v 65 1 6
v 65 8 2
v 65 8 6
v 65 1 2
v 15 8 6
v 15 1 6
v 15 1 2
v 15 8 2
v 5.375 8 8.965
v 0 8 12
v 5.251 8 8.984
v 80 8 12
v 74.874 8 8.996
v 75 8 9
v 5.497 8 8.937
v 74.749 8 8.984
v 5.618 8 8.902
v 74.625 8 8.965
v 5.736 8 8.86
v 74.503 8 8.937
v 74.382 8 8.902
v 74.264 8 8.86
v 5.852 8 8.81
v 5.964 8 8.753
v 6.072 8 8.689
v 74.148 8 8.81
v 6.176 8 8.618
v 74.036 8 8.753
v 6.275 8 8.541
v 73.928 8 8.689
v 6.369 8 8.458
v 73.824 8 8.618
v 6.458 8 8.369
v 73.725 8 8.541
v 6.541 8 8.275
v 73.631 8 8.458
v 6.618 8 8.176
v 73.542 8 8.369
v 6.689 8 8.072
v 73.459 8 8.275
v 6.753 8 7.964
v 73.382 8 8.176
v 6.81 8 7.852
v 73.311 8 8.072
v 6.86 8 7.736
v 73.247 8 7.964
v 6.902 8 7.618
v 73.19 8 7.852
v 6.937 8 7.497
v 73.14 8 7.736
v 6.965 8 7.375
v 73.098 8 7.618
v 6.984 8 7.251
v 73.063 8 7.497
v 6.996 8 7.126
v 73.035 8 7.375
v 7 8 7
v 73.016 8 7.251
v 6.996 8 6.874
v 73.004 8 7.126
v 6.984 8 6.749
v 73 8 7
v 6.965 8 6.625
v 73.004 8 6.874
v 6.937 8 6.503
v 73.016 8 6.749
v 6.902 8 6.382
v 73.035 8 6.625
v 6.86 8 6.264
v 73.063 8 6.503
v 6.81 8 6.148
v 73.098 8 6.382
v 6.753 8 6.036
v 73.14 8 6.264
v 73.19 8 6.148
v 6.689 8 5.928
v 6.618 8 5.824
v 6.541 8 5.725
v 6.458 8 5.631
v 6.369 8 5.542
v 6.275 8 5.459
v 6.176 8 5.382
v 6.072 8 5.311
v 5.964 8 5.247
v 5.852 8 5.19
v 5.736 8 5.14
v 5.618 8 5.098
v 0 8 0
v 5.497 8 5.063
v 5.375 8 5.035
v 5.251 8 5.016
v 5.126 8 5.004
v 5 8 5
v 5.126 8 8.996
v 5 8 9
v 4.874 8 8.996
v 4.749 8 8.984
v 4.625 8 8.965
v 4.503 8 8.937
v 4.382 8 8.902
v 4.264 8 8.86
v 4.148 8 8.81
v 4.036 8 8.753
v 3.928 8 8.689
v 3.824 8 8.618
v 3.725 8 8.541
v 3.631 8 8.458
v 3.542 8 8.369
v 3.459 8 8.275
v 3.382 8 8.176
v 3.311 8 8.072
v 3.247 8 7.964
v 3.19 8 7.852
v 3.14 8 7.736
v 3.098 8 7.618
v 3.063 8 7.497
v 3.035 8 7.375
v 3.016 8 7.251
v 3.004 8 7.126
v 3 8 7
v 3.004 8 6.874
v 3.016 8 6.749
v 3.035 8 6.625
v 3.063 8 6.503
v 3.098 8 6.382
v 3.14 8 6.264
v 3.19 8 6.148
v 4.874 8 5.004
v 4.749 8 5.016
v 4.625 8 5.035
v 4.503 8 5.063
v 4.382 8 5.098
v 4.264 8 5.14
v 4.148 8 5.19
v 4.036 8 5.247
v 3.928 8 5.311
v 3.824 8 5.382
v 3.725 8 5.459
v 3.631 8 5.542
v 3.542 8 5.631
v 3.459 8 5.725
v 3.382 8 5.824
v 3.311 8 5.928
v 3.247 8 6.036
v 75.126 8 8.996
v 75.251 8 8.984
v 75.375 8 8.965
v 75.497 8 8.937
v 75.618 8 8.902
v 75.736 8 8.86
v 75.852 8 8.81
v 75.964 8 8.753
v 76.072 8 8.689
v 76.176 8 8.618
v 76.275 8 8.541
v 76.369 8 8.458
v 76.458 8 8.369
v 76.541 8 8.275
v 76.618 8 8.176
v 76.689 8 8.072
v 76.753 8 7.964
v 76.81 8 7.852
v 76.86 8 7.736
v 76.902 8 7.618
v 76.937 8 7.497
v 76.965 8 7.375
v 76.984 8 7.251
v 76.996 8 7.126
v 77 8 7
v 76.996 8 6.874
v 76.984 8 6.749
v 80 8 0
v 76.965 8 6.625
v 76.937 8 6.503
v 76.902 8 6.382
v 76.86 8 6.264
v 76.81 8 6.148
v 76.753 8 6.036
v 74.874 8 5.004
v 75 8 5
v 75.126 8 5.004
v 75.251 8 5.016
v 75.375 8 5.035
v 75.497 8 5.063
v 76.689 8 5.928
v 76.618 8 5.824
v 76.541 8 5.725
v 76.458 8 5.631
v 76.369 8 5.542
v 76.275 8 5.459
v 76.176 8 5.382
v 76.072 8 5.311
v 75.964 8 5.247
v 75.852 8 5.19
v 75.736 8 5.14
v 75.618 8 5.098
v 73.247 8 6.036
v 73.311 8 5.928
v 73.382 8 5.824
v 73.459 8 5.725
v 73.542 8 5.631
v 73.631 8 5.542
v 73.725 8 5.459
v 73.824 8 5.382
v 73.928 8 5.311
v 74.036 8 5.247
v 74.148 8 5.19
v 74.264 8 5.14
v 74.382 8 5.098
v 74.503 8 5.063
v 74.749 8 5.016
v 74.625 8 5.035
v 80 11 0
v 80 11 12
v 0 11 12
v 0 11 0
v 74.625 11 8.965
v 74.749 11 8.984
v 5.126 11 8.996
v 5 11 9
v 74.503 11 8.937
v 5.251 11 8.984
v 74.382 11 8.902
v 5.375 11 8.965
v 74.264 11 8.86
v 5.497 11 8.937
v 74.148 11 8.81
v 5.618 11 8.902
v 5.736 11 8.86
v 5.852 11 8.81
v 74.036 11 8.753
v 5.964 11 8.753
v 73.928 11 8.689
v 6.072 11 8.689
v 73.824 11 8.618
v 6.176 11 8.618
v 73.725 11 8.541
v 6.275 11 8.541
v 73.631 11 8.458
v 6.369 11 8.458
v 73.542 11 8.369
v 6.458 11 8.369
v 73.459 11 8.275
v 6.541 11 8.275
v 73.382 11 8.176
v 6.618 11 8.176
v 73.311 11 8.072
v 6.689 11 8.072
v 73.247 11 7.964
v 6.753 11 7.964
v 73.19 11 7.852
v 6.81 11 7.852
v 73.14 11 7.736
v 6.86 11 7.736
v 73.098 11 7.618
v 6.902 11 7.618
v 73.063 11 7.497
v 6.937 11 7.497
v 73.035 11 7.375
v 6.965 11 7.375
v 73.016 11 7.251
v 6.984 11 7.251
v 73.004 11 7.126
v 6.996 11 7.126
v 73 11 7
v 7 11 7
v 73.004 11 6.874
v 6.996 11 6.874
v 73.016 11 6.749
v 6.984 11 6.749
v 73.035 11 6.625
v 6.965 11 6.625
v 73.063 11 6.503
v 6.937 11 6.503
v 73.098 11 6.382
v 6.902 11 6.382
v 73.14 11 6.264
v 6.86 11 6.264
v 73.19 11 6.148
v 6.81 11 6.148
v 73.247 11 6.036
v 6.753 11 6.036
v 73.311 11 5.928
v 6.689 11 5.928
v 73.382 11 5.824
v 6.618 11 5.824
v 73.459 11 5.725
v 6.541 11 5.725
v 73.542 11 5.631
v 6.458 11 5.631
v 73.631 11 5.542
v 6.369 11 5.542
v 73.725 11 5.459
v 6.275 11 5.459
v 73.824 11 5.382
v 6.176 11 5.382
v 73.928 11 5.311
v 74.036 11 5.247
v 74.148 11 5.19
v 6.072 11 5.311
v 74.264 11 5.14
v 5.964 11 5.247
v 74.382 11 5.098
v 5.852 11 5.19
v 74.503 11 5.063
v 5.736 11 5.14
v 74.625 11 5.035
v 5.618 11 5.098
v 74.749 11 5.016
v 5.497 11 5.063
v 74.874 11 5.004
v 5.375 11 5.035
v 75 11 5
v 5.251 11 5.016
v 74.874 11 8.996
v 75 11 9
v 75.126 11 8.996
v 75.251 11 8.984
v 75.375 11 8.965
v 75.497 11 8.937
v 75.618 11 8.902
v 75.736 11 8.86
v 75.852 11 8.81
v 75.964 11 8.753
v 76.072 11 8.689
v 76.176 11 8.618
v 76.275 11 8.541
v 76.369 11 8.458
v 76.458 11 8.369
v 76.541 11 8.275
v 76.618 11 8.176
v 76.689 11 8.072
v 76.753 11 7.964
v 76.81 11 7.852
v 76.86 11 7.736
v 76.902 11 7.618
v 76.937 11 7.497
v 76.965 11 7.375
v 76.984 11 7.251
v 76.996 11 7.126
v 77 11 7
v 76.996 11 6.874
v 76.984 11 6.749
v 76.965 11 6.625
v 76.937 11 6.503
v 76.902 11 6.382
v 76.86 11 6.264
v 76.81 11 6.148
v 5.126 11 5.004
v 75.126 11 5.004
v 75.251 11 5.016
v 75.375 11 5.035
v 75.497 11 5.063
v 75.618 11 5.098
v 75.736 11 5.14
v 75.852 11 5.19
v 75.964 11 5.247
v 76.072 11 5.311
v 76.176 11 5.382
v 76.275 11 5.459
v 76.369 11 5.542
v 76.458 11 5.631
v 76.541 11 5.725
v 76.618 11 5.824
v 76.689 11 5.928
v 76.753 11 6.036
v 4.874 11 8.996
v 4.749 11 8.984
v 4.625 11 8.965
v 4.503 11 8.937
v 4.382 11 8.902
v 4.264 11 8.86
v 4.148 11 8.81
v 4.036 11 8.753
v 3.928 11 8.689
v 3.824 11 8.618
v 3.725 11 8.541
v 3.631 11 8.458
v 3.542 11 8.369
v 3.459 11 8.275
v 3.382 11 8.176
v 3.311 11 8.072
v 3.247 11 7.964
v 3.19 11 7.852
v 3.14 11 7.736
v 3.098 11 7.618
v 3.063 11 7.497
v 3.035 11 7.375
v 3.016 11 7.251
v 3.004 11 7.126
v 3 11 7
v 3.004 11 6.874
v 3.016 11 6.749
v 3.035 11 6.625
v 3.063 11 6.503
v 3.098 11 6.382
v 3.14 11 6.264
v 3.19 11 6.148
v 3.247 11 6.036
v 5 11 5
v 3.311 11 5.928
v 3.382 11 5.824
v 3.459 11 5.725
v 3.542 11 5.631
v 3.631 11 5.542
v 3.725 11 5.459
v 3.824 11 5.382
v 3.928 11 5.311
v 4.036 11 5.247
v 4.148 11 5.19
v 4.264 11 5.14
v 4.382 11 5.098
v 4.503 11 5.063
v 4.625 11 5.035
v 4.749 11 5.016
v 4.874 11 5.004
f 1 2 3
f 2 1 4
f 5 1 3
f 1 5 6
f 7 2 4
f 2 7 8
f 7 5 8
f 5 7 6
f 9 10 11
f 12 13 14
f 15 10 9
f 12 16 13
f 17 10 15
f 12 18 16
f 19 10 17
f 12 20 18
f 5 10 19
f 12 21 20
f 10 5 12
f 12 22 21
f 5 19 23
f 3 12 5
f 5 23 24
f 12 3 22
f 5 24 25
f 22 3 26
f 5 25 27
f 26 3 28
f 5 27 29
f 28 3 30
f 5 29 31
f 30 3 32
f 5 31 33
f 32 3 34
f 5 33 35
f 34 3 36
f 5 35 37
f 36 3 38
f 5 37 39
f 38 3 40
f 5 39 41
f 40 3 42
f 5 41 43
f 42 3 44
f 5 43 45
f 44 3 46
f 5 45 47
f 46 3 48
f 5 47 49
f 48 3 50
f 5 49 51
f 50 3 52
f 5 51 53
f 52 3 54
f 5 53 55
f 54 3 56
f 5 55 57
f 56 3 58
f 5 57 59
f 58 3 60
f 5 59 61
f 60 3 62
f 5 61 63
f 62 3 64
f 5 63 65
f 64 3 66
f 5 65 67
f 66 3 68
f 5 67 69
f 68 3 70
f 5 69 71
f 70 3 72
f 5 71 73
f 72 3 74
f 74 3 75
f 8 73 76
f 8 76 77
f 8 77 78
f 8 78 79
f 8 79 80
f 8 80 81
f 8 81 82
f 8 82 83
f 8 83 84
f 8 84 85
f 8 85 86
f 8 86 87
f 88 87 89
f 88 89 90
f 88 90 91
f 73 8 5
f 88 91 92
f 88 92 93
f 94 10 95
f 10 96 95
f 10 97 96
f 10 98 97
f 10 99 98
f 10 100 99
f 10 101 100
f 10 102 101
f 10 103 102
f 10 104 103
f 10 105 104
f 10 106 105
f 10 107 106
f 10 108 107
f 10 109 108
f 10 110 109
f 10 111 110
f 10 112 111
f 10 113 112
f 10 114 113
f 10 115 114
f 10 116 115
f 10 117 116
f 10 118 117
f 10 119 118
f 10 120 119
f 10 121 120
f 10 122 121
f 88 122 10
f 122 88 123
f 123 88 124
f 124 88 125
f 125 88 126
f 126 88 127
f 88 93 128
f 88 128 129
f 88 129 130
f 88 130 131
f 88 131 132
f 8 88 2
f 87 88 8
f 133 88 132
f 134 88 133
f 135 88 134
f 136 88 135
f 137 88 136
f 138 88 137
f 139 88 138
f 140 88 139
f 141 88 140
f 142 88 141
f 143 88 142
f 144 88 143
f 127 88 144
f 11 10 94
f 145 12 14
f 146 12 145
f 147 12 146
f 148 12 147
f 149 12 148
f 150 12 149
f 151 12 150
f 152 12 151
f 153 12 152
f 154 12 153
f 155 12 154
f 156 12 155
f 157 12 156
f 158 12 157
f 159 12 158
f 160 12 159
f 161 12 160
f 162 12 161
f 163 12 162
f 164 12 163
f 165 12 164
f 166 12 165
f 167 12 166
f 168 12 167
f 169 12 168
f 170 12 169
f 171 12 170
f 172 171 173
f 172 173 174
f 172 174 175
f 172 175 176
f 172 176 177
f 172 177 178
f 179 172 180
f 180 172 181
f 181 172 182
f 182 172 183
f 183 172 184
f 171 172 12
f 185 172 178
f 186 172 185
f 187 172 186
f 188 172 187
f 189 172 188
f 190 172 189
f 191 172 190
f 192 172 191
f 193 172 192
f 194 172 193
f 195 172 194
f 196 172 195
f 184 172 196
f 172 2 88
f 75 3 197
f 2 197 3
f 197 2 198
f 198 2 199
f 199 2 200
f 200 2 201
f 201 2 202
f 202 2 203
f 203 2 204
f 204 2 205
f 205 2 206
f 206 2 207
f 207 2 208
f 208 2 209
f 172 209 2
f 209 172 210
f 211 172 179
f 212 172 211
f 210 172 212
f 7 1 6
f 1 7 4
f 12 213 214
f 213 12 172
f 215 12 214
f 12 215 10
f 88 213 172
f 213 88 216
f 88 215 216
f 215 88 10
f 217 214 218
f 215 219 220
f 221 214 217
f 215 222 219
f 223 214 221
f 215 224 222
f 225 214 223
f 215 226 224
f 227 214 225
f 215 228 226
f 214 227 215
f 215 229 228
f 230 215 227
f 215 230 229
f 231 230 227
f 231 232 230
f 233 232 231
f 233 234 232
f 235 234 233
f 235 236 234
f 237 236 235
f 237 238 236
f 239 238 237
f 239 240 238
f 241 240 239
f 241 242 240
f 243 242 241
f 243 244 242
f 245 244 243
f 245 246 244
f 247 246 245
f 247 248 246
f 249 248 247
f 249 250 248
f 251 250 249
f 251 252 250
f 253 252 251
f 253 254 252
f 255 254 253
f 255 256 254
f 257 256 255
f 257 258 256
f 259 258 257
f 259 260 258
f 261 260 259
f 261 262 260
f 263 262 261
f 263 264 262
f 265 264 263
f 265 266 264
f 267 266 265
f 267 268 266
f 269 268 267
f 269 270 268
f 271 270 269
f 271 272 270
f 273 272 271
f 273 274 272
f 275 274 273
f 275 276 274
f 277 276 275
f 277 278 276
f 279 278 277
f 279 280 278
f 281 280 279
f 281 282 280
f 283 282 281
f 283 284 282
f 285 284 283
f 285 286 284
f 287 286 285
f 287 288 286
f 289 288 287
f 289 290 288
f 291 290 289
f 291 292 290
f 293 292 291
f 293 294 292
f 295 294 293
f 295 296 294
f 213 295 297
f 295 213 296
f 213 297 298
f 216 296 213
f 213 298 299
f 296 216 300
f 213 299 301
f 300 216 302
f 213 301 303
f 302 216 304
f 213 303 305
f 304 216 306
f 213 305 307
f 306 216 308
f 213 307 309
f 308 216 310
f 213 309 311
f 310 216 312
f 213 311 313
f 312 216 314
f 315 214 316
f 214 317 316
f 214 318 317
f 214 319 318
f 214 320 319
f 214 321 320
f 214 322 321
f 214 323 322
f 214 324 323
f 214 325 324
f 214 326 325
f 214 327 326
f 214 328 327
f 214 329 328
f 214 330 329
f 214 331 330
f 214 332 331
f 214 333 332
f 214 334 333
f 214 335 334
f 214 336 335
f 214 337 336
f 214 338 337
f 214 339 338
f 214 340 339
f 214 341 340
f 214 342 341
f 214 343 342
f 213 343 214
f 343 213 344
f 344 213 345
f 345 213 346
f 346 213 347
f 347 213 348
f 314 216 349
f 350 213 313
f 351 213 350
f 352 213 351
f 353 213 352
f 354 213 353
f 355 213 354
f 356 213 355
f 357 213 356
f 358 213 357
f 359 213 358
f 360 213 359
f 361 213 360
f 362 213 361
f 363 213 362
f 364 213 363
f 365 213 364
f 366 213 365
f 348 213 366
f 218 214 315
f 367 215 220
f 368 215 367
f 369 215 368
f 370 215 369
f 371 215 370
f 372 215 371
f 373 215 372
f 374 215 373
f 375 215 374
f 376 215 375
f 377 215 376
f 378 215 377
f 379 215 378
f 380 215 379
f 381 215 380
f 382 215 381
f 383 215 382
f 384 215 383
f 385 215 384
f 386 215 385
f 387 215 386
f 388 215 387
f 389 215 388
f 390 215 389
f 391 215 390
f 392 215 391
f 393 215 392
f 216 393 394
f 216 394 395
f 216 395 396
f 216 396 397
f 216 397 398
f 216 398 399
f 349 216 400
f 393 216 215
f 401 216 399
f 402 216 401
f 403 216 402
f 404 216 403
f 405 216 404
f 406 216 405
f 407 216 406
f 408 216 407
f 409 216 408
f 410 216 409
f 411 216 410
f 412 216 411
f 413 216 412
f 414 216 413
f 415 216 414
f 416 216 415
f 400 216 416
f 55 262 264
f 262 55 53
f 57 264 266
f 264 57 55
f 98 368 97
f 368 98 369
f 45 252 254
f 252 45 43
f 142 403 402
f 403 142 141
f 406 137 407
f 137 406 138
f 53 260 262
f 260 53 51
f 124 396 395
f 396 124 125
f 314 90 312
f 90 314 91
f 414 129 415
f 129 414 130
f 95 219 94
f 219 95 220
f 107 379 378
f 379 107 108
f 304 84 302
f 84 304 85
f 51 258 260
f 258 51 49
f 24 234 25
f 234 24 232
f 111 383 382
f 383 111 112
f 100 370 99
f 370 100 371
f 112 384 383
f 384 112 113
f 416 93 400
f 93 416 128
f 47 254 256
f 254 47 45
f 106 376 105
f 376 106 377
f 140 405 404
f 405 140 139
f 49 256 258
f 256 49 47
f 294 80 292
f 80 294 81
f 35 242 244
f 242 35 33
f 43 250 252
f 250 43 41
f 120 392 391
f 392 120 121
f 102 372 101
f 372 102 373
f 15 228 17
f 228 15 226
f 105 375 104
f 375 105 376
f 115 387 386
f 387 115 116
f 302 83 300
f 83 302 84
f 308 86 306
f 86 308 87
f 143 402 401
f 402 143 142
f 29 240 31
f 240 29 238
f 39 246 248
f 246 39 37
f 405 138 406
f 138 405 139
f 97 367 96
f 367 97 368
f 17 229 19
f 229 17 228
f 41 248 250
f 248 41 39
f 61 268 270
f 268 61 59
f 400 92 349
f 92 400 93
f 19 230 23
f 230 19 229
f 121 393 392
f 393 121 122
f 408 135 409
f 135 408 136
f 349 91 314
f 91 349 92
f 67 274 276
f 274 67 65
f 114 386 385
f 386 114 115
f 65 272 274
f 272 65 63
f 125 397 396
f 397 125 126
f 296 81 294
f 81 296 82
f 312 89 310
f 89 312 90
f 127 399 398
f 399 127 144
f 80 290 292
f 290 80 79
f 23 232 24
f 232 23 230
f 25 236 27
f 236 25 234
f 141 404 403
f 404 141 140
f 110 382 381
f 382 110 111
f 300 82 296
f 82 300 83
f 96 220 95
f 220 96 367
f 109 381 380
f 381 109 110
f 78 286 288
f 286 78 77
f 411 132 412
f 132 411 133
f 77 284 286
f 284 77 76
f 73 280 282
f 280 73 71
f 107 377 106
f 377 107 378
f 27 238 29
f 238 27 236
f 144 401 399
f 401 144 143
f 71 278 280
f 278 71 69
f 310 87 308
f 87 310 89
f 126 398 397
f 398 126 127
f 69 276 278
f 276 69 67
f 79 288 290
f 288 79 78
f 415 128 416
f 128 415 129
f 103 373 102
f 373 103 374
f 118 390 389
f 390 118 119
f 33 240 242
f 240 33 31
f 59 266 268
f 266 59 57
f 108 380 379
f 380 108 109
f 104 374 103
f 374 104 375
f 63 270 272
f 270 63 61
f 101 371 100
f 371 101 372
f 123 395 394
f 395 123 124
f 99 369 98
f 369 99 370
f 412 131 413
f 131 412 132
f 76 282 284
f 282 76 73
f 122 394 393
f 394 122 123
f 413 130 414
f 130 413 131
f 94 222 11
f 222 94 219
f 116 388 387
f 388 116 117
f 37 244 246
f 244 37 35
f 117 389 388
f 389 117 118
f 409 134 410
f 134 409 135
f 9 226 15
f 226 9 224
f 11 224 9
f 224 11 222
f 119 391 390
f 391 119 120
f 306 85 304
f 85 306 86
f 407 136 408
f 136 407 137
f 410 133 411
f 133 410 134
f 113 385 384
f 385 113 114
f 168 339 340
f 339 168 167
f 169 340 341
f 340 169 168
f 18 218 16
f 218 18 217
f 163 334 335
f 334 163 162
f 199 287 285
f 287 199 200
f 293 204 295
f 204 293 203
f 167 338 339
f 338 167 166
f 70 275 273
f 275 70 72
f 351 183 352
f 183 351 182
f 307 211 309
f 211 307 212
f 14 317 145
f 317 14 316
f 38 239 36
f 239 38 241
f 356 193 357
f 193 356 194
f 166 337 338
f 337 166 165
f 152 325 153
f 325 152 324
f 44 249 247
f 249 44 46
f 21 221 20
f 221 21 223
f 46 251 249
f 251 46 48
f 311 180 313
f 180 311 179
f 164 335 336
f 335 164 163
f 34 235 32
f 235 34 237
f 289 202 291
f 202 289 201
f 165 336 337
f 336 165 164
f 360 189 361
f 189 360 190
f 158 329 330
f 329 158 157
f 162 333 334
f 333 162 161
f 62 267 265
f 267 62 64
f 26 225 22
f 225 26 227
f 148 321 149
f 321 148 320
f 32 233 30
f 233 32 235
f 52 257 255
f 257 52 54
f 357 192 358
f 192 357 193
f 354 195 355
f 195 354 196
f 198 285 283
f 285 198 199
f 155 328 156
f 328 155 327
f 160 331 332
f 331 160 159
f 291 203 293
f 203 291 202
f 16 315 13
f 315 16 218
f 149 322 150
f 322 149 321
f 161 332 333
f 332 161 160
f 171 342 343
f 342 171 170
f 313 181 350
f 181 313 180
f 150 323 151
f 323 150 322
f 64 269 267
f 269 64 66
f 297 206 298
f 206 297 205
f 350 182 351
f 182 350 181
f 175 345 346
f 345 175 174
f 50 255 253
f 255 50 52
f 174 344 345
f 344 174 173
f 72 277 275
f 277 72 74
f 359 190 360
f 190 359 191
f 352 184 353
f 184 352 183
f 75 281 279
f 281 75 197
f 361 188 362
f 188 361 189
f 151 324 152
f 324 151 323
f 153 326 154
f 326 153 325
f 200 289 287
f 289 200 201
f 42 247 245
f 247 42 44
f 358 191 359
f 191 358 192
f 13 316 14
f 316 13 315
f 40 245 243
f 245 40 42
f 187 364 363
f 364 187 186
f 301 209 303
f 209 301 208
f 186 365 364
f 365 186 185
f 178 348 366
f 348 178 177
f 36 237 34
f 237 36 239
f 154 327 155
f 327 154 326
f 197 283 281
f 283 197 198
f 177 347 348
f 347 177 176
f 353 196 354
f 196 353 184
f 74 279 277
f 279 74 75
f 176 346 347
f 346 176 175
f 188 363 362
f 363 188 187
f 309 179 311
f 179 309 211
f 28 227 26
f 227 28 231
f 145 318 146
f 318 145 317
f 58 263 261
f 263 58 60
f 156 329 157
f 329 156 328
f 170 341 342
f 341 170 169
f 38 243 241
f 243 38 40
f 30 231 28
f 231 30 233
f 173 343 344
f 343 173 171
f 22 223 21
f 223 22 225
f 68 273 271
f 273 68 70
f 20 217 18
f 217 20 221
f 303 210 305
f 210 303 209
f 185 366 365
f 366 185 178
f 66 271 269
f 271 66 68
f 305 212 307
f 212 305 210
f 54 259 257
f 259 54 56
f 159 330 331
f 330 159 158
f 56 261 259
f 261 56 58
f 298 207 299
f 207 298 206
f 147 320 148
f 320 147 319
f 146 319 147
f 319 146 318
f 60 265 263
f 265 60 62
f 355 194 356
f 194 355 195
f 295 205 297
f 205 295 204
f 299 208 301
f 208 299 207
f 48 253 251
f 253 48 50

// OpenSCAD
difference(){
	union(){



        translate([15,1,2]){
           cube([50,7,4], center=false);
        }        
        translate([0,8,0]){
           cube([80,3,12], center=false);
        }        
             
        
	}
	union() {

        translate([5,20,7]){
            rotate([90,0,0]){
               cylinder(h=999, r=2, $fn=100, center=false);
            }
        }
        translate([75,20,7]){
            rotate([90,0,0]){
               cylinder(h=999, r=2, $fn=100, center=false);
            }
        }
     


	}
}
